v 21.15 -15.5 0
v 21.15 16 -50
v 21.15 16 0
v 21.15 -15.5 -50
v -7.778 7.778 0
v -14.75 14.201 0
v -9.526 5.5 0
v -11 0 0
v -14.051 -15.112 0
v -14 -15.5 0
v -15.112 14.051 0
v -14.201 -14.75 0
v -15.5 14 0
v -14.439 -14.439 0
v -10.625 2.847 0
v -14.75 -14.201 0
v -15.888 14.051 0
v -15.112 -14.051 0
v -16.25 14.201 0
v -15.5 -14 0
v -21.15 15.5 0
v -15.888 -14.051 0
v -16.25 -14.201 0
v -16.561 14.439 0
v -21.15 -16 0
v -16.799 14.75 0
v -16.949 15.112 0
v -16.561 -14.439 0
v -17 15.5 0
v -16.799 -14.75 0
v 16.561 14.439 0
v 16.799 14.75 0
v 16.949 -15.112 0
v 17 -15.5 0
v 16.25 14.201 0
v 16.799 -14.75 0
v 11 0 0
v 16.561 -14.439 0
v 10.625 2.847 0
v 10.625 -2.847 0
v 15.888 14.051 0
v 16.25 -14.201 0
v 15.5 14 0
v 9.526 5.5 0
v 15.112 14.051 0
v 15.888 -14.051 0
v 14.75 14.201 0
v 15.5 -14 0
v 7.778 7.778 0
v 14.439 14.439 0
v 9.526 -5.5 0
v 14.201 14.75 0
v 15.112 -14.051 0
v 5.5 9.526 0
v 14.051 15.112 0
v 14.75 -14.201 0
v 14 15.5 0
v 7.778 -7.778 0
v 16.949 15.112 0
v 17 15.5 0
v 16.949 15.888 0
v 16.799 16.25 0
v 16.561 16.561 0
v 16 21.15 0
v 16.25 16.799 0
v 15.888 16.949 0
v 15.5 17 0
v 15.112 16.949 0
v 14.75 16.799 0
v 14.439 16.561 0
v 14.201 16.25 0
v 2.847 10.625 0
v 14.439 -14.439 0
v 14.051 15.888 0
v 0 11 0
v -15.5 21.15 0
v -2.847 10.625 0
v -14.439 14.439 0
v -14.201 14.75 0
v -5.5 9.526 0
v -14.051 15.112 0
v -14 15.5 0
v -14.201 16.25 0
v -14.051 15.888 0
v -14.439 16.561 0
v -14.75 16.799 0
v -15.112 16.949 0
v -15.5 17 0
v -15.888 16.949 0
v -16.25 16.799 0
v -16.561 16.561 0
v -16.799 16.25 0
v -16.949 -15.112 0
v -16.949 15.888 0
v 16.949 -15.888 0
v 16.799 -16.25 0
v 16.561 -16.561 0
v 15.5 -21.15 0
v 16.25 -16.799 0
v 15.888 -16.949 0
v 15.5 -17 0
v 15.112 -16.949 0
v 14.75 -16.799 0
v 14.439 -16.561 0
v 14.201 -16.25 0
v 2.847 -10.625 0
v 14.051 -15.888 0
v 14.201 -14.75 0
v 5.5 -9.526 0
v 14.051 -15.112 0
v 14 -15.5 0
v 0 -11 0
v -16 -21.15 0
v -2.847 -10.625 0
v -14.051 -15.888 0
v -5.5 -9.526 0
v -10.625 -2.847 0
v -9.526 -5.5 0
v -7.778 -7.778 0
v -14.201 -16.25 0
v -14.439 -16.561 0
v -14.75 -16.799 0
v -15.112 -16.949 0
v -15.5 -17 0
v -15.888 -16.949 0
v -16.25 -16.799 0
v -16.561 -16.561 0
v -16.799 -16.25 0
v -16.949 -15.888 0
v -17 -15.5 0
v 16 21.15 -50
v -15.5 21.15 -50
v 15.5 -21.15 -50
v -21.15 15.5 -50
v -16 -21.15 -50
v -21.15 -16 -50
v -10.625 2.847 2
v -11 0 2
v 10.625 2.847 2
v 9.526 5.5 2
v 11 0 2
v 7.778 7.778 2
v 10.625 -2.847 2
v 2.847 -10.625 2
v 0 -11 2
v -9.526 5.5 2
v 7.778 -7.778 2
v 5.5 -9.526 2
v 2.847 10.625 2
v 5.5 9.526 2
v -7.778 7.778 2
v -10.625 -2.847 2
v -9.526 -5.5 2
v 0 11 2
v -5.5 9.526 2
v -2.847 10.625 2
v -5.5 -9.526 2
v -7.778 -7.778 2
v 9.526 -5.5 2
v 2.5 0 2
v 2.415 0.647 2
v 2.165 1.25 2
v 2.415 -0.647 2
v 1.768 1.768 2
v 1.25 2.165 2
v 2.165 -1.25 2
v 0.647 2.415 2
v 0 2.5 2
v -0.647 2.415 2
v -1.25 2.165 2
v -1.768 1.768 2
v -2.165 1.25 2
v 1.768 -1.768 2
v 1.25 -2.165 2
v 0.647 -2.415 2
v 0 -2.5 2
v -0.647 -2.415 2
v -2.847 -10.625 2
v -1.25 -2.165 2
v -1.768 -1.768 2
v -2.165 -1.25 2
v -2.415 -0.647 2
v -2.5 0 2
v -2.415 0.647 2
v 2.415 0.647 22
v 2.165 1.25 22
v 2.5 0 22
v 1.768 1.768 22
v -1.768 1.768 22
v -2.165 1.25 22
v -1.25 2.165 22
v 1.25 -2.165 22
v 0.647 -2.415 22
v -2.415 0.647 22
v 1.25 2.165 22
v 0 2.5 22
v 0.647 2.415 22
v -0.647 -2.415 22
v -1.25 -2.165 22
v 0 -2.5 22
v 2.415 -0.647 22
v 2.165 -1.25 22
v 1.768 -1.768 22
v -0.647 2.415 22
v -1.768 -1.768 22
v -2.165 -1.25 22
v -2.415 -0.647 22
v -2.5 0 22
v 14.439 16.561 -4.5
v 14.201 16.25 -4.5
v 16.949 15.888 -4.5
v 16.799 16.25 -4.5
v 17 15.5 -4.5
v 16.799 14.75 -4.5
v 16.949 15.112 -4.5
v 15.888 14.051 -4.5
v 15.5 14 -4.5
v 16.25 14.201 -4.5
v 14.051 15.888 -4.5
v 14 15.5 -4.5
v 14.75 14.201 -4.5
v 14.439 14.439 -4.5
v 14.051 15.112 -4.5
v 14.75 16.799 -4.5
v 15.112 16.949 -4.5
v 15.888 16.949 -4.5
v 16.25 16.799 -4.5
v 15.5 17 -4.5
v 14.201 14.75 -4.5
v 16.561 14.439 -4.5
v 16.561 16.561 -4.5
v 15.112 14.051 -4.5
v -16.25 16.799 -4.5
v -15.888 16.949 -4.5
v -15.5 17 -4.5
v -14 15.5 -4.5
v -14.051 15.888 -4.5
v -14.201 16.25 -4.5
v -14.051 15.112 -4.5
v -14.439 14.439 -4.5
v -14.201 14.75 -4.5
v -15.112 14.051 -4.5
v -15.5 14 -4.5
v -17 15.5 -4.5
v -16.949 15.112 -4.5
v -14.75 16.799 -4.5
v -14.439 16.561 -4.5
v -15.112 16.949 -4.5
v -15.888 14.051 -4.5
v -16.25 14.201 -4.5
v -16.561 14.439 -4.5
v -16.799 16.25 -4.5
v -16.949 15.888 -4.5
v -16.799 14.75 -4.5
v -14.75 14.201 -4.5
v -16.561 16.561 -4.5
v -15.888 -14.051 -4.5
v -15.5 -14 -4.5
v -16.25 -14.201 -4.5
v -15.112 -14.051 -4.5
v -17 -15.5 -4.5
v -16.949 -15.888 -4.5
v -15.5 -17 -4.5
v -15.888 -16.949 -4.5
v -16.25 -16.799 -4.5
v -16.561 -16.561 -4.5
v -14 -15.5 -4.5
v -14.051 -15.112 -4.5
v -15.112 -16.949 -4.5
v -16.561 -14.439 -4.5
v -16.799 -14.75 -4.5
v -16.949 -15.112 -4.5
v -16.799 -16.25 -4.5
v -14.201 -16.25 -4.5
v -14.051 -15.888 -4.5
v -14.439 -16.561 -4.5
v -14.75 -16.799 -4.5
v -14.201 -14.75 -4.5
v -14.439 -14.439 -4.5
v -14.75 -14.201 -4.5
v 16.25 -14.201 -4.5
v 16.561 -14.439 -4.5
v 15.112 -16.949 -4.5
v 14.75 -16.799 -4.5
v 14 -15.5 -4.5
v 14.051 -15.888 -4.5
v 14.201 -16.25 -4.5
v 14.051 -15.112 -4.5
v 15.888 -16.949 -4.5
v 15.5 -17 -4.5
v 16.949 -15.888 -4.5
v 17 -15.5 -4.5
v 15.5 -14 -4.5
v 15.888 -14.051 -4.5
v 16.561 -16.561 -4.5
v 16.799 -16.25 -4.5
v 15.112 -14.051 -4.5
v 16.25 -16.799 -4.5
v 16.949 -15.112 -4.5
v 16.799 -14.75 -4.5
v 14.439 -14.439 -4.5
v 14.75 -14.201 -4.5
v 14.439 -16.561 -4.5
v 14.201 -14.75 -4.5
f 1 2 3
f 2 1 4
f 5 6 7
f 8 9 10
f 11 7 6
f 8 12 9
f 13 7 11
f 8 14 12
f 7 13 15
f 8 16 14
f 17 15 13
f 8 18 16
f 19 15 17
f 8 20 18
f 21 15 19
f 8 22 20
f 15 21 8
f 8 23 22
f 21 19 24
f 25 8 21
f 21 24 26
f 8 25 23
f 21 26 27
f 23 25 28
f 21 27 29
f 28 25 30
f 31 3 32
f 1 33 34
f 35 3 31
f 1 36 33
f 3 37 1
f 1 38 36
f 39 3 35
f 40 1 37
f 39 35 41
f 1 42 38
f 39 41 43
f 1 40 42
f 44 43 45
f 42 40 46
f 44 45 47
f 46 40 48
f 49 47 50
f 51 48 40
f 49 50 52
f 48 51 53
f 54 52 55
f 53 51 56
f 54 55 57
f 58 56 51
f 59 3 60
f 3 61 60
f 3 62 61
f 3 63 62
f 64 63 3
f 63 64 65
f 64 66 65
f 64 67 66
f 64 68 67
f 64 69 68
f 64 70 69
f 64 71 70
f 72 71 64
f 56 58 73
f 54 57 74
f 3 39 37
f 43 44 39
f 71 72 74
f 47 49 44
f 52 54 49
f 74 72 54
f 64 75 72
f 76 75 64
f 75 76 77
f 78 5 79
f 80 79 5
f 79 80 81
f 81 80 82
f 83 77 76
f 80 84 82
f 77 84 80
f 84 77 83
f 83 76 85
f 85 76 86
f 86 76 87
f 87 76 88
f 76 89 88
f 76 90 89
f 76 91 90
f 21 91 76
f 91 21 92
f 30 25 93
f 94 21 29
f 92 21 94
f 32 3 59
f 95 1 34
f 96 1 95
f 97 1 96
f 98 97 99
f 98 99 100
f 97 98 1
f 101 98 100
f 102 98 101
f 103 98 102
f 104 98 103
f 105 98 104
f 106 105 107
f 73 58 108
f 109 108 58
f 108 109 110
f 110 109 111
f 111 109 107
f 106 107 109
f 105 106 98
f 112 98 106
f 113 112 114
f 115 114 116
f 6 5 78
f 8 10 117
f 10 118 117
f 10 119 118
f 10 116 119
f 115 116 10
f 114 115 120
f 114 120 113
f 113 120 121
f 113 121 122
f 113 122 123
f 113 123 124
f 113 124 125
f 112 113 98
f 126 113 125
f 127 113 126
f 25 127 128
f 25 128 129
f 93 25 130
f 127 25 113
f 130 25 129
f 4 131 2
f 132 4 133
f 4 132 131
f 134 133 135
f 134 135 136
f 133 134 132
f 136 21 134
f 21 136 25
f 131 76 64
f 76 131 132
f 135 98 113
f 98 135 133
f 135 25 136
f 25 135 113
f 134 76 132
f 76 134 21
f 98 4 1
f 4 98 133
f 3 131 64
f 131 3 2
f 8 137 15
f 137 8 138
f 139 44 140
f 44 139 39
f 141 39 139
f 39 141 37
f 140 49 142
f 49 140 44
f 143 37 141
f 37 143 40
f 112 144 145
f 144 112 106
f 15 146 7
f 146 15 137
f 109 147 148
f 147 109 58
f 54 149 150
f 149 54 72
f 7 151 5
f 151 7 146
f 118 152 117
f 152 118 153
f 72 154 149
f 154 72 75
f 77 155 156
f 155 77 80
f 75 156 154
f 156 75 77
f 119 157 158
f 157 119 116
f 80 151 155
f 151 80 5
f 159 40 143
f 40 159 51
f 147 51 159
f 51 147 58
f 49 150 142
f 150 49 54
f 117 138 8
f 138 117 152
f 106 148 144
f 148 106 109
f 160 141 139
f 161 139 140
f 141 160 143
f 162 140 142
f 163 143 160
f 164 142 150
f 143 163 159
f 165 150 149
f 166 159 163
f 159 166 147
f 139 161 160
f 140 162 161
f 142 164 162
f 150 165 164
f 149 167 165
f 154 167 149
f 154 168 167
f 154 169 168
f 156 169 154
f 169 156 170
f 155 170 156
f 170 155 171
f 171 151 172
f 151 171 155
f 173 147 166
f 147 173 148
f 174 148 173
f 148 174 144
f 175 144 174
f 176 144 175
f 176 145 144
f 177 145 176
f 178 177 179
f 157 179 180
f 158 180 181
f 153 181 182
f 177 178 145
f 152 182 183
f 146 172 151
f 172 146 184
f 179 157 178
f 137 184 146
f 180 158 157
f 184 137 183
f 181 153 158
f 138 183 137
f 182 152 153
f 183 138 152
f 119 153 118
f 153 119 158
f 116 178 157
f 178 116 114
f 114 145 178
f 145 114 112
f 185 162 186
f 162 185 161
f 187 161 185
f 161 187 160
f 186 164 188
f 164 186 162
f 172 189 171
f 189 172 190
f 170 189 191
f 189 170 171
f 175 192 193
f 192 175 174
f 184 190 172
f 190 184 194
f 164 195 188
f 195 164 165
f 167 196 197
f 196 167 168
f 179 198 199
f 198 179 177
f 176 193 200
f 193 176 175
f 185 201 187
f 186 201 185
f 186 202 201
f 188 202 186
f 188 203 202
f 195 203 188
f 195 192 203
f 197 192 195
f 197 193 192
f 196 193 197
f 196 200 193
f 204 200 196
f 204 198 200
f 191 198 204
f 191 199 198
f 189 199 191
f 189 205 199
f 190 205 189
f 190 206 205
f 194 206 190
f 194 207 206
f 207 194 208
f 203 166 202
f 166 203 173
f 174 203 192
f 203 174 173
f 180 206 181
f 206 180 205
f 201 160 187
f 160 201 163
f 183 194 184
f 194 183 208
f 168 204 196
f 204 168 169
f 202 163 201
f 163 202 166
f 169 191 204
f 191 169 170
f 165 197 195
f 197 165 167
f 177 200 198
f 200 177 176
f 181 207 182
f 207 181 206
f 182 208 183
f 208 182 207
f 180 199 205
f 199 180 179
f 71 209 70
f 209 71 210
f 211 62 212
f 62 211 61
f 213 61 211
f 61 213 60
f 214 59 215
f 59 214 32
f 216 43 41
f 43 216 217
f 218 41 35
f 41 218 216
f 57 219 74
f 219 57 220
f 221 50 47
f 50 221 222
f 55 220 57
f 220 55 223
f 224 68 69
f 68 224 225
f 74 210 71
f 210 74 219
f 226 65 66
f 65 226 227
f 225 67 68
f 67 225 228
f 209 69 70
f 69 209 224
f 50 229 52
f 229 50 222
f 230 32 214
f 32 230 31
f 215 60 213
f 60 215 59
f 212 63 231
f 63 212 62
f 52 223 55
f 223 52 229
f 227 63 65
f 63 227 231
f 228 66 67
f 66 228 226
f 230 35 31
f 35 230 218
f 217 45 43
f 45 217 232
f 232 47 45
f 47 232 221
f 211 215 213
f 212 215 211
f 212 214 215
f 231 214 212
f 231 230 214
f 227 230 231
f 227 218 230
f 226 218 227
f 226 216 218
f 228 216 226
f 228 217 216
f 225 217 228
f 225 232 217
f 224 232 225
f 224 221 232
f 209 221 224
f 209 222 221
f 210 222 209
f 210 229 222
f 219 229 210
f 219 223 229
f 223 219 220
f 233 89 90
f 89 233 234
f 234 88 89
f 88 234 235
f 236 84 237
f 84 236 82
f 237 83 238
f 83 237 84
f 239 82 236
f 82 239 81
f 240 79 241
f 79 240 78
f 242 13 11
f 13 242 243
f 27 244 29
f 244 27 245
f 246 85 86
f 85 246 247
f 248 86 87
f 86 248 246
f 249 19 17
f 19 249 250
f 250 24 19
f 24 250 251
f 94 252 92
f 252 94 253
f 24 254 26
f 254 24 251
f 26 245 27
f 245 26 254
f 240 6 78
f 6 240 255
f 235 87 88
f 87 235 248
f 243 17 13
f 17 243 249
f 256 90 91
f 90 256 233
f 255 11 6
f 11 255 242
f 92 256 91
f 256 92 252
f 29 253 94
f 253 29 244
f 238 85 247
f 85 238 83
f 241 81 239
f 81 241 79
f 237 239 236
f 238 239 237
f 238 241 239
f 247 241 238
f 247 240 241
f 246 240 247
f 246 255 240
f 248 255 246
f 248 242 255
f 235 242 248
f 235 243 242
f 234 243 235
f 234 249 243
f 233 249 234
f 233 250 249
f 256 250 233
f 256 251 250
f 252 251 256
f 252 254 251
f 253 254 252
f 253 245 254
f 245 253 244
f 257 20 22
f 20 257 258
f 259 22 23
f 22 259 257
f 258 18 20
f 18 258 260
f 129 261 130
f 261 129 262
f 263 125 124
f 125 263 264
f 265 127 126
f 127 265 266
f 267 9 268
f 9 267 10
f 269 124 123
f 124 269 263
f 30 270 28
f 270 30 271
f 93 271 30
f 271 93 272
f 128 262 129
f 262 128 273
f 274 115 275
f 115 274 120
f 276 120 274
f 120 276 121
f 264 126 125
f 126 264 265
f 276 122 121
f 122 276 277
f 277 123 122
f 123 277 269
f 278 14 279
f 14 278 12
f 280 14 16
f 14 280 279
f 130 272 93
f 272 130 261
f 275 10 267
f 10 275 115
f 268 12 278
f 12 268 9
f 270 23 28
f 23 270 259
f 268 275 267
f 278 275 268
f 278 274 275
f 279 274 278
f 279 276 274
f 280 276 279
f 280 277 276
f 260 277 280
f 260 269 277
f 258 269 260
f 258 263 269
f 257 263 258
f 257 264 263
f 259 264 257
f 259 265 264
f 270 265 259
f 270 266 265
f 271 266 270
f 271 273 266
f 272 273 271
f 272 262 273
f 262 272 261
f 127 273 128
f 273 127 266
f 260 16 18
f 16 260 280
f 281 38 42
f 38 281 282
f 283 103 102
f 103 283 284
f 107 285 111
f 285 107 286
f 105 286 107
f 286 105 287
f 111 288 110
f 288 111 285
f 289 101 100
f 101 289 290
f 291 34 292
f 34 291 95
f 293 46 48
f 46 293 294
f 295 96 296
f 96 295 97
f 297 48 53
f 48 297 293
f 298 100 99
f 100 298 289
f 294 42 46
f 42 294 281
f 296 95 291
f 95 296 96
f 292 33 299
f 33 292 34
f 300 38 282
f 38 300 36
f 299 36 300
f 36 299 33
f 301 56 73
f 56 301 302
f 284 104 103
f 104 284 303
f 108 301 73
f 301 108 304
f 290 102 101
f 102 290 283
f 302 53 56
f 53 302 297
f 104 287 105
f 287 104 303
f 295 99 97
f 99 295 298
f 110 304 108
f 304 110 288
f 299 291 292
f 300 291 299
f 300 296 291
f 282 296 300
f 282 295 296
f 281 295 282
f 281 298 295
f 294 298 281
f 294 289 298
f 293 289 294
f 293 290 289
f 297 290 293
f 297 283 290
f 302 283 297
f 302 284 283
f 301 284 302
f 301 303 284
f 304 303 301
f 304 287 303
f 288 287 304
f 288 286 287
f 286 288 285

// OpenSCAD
//Quick design of a NEMA 17 (SM-42BYG011-25) motor

//motor_height = 34.0;

nema17(50);
nema17_width=43.2;

module nema17(motor_height){
    translate([0,0,-motor_height])
    difference(){
    //motor
        union(){
            translate([0,0,motor_height/2]){
                intersection(){
                    cube([42.3,42.3,motor_height], center = true);
                    rotate([0,0,45]) translate([0,0,-1]) cube([74.3*sin(45), 73.3*sin(45) ,motor_height+2], center = true);
                }
            }
            translate([0, 0, motor_height]) cylinder(h=2, r=11, $fn=24);
            translate([0, 0, motor_height+2]) cylinder(h=20, r=2.5, $fn=24);
        }
    //screw holes
        for(i=[0:3]){
                rotate([0, 0, 90*i])translate([15.5, 15.5, motor_height-4.5]) cylinder(h=5, r=1.5, $fn=24);
            }
    }
}

function get_nema17_width() = nema17_width;
		
